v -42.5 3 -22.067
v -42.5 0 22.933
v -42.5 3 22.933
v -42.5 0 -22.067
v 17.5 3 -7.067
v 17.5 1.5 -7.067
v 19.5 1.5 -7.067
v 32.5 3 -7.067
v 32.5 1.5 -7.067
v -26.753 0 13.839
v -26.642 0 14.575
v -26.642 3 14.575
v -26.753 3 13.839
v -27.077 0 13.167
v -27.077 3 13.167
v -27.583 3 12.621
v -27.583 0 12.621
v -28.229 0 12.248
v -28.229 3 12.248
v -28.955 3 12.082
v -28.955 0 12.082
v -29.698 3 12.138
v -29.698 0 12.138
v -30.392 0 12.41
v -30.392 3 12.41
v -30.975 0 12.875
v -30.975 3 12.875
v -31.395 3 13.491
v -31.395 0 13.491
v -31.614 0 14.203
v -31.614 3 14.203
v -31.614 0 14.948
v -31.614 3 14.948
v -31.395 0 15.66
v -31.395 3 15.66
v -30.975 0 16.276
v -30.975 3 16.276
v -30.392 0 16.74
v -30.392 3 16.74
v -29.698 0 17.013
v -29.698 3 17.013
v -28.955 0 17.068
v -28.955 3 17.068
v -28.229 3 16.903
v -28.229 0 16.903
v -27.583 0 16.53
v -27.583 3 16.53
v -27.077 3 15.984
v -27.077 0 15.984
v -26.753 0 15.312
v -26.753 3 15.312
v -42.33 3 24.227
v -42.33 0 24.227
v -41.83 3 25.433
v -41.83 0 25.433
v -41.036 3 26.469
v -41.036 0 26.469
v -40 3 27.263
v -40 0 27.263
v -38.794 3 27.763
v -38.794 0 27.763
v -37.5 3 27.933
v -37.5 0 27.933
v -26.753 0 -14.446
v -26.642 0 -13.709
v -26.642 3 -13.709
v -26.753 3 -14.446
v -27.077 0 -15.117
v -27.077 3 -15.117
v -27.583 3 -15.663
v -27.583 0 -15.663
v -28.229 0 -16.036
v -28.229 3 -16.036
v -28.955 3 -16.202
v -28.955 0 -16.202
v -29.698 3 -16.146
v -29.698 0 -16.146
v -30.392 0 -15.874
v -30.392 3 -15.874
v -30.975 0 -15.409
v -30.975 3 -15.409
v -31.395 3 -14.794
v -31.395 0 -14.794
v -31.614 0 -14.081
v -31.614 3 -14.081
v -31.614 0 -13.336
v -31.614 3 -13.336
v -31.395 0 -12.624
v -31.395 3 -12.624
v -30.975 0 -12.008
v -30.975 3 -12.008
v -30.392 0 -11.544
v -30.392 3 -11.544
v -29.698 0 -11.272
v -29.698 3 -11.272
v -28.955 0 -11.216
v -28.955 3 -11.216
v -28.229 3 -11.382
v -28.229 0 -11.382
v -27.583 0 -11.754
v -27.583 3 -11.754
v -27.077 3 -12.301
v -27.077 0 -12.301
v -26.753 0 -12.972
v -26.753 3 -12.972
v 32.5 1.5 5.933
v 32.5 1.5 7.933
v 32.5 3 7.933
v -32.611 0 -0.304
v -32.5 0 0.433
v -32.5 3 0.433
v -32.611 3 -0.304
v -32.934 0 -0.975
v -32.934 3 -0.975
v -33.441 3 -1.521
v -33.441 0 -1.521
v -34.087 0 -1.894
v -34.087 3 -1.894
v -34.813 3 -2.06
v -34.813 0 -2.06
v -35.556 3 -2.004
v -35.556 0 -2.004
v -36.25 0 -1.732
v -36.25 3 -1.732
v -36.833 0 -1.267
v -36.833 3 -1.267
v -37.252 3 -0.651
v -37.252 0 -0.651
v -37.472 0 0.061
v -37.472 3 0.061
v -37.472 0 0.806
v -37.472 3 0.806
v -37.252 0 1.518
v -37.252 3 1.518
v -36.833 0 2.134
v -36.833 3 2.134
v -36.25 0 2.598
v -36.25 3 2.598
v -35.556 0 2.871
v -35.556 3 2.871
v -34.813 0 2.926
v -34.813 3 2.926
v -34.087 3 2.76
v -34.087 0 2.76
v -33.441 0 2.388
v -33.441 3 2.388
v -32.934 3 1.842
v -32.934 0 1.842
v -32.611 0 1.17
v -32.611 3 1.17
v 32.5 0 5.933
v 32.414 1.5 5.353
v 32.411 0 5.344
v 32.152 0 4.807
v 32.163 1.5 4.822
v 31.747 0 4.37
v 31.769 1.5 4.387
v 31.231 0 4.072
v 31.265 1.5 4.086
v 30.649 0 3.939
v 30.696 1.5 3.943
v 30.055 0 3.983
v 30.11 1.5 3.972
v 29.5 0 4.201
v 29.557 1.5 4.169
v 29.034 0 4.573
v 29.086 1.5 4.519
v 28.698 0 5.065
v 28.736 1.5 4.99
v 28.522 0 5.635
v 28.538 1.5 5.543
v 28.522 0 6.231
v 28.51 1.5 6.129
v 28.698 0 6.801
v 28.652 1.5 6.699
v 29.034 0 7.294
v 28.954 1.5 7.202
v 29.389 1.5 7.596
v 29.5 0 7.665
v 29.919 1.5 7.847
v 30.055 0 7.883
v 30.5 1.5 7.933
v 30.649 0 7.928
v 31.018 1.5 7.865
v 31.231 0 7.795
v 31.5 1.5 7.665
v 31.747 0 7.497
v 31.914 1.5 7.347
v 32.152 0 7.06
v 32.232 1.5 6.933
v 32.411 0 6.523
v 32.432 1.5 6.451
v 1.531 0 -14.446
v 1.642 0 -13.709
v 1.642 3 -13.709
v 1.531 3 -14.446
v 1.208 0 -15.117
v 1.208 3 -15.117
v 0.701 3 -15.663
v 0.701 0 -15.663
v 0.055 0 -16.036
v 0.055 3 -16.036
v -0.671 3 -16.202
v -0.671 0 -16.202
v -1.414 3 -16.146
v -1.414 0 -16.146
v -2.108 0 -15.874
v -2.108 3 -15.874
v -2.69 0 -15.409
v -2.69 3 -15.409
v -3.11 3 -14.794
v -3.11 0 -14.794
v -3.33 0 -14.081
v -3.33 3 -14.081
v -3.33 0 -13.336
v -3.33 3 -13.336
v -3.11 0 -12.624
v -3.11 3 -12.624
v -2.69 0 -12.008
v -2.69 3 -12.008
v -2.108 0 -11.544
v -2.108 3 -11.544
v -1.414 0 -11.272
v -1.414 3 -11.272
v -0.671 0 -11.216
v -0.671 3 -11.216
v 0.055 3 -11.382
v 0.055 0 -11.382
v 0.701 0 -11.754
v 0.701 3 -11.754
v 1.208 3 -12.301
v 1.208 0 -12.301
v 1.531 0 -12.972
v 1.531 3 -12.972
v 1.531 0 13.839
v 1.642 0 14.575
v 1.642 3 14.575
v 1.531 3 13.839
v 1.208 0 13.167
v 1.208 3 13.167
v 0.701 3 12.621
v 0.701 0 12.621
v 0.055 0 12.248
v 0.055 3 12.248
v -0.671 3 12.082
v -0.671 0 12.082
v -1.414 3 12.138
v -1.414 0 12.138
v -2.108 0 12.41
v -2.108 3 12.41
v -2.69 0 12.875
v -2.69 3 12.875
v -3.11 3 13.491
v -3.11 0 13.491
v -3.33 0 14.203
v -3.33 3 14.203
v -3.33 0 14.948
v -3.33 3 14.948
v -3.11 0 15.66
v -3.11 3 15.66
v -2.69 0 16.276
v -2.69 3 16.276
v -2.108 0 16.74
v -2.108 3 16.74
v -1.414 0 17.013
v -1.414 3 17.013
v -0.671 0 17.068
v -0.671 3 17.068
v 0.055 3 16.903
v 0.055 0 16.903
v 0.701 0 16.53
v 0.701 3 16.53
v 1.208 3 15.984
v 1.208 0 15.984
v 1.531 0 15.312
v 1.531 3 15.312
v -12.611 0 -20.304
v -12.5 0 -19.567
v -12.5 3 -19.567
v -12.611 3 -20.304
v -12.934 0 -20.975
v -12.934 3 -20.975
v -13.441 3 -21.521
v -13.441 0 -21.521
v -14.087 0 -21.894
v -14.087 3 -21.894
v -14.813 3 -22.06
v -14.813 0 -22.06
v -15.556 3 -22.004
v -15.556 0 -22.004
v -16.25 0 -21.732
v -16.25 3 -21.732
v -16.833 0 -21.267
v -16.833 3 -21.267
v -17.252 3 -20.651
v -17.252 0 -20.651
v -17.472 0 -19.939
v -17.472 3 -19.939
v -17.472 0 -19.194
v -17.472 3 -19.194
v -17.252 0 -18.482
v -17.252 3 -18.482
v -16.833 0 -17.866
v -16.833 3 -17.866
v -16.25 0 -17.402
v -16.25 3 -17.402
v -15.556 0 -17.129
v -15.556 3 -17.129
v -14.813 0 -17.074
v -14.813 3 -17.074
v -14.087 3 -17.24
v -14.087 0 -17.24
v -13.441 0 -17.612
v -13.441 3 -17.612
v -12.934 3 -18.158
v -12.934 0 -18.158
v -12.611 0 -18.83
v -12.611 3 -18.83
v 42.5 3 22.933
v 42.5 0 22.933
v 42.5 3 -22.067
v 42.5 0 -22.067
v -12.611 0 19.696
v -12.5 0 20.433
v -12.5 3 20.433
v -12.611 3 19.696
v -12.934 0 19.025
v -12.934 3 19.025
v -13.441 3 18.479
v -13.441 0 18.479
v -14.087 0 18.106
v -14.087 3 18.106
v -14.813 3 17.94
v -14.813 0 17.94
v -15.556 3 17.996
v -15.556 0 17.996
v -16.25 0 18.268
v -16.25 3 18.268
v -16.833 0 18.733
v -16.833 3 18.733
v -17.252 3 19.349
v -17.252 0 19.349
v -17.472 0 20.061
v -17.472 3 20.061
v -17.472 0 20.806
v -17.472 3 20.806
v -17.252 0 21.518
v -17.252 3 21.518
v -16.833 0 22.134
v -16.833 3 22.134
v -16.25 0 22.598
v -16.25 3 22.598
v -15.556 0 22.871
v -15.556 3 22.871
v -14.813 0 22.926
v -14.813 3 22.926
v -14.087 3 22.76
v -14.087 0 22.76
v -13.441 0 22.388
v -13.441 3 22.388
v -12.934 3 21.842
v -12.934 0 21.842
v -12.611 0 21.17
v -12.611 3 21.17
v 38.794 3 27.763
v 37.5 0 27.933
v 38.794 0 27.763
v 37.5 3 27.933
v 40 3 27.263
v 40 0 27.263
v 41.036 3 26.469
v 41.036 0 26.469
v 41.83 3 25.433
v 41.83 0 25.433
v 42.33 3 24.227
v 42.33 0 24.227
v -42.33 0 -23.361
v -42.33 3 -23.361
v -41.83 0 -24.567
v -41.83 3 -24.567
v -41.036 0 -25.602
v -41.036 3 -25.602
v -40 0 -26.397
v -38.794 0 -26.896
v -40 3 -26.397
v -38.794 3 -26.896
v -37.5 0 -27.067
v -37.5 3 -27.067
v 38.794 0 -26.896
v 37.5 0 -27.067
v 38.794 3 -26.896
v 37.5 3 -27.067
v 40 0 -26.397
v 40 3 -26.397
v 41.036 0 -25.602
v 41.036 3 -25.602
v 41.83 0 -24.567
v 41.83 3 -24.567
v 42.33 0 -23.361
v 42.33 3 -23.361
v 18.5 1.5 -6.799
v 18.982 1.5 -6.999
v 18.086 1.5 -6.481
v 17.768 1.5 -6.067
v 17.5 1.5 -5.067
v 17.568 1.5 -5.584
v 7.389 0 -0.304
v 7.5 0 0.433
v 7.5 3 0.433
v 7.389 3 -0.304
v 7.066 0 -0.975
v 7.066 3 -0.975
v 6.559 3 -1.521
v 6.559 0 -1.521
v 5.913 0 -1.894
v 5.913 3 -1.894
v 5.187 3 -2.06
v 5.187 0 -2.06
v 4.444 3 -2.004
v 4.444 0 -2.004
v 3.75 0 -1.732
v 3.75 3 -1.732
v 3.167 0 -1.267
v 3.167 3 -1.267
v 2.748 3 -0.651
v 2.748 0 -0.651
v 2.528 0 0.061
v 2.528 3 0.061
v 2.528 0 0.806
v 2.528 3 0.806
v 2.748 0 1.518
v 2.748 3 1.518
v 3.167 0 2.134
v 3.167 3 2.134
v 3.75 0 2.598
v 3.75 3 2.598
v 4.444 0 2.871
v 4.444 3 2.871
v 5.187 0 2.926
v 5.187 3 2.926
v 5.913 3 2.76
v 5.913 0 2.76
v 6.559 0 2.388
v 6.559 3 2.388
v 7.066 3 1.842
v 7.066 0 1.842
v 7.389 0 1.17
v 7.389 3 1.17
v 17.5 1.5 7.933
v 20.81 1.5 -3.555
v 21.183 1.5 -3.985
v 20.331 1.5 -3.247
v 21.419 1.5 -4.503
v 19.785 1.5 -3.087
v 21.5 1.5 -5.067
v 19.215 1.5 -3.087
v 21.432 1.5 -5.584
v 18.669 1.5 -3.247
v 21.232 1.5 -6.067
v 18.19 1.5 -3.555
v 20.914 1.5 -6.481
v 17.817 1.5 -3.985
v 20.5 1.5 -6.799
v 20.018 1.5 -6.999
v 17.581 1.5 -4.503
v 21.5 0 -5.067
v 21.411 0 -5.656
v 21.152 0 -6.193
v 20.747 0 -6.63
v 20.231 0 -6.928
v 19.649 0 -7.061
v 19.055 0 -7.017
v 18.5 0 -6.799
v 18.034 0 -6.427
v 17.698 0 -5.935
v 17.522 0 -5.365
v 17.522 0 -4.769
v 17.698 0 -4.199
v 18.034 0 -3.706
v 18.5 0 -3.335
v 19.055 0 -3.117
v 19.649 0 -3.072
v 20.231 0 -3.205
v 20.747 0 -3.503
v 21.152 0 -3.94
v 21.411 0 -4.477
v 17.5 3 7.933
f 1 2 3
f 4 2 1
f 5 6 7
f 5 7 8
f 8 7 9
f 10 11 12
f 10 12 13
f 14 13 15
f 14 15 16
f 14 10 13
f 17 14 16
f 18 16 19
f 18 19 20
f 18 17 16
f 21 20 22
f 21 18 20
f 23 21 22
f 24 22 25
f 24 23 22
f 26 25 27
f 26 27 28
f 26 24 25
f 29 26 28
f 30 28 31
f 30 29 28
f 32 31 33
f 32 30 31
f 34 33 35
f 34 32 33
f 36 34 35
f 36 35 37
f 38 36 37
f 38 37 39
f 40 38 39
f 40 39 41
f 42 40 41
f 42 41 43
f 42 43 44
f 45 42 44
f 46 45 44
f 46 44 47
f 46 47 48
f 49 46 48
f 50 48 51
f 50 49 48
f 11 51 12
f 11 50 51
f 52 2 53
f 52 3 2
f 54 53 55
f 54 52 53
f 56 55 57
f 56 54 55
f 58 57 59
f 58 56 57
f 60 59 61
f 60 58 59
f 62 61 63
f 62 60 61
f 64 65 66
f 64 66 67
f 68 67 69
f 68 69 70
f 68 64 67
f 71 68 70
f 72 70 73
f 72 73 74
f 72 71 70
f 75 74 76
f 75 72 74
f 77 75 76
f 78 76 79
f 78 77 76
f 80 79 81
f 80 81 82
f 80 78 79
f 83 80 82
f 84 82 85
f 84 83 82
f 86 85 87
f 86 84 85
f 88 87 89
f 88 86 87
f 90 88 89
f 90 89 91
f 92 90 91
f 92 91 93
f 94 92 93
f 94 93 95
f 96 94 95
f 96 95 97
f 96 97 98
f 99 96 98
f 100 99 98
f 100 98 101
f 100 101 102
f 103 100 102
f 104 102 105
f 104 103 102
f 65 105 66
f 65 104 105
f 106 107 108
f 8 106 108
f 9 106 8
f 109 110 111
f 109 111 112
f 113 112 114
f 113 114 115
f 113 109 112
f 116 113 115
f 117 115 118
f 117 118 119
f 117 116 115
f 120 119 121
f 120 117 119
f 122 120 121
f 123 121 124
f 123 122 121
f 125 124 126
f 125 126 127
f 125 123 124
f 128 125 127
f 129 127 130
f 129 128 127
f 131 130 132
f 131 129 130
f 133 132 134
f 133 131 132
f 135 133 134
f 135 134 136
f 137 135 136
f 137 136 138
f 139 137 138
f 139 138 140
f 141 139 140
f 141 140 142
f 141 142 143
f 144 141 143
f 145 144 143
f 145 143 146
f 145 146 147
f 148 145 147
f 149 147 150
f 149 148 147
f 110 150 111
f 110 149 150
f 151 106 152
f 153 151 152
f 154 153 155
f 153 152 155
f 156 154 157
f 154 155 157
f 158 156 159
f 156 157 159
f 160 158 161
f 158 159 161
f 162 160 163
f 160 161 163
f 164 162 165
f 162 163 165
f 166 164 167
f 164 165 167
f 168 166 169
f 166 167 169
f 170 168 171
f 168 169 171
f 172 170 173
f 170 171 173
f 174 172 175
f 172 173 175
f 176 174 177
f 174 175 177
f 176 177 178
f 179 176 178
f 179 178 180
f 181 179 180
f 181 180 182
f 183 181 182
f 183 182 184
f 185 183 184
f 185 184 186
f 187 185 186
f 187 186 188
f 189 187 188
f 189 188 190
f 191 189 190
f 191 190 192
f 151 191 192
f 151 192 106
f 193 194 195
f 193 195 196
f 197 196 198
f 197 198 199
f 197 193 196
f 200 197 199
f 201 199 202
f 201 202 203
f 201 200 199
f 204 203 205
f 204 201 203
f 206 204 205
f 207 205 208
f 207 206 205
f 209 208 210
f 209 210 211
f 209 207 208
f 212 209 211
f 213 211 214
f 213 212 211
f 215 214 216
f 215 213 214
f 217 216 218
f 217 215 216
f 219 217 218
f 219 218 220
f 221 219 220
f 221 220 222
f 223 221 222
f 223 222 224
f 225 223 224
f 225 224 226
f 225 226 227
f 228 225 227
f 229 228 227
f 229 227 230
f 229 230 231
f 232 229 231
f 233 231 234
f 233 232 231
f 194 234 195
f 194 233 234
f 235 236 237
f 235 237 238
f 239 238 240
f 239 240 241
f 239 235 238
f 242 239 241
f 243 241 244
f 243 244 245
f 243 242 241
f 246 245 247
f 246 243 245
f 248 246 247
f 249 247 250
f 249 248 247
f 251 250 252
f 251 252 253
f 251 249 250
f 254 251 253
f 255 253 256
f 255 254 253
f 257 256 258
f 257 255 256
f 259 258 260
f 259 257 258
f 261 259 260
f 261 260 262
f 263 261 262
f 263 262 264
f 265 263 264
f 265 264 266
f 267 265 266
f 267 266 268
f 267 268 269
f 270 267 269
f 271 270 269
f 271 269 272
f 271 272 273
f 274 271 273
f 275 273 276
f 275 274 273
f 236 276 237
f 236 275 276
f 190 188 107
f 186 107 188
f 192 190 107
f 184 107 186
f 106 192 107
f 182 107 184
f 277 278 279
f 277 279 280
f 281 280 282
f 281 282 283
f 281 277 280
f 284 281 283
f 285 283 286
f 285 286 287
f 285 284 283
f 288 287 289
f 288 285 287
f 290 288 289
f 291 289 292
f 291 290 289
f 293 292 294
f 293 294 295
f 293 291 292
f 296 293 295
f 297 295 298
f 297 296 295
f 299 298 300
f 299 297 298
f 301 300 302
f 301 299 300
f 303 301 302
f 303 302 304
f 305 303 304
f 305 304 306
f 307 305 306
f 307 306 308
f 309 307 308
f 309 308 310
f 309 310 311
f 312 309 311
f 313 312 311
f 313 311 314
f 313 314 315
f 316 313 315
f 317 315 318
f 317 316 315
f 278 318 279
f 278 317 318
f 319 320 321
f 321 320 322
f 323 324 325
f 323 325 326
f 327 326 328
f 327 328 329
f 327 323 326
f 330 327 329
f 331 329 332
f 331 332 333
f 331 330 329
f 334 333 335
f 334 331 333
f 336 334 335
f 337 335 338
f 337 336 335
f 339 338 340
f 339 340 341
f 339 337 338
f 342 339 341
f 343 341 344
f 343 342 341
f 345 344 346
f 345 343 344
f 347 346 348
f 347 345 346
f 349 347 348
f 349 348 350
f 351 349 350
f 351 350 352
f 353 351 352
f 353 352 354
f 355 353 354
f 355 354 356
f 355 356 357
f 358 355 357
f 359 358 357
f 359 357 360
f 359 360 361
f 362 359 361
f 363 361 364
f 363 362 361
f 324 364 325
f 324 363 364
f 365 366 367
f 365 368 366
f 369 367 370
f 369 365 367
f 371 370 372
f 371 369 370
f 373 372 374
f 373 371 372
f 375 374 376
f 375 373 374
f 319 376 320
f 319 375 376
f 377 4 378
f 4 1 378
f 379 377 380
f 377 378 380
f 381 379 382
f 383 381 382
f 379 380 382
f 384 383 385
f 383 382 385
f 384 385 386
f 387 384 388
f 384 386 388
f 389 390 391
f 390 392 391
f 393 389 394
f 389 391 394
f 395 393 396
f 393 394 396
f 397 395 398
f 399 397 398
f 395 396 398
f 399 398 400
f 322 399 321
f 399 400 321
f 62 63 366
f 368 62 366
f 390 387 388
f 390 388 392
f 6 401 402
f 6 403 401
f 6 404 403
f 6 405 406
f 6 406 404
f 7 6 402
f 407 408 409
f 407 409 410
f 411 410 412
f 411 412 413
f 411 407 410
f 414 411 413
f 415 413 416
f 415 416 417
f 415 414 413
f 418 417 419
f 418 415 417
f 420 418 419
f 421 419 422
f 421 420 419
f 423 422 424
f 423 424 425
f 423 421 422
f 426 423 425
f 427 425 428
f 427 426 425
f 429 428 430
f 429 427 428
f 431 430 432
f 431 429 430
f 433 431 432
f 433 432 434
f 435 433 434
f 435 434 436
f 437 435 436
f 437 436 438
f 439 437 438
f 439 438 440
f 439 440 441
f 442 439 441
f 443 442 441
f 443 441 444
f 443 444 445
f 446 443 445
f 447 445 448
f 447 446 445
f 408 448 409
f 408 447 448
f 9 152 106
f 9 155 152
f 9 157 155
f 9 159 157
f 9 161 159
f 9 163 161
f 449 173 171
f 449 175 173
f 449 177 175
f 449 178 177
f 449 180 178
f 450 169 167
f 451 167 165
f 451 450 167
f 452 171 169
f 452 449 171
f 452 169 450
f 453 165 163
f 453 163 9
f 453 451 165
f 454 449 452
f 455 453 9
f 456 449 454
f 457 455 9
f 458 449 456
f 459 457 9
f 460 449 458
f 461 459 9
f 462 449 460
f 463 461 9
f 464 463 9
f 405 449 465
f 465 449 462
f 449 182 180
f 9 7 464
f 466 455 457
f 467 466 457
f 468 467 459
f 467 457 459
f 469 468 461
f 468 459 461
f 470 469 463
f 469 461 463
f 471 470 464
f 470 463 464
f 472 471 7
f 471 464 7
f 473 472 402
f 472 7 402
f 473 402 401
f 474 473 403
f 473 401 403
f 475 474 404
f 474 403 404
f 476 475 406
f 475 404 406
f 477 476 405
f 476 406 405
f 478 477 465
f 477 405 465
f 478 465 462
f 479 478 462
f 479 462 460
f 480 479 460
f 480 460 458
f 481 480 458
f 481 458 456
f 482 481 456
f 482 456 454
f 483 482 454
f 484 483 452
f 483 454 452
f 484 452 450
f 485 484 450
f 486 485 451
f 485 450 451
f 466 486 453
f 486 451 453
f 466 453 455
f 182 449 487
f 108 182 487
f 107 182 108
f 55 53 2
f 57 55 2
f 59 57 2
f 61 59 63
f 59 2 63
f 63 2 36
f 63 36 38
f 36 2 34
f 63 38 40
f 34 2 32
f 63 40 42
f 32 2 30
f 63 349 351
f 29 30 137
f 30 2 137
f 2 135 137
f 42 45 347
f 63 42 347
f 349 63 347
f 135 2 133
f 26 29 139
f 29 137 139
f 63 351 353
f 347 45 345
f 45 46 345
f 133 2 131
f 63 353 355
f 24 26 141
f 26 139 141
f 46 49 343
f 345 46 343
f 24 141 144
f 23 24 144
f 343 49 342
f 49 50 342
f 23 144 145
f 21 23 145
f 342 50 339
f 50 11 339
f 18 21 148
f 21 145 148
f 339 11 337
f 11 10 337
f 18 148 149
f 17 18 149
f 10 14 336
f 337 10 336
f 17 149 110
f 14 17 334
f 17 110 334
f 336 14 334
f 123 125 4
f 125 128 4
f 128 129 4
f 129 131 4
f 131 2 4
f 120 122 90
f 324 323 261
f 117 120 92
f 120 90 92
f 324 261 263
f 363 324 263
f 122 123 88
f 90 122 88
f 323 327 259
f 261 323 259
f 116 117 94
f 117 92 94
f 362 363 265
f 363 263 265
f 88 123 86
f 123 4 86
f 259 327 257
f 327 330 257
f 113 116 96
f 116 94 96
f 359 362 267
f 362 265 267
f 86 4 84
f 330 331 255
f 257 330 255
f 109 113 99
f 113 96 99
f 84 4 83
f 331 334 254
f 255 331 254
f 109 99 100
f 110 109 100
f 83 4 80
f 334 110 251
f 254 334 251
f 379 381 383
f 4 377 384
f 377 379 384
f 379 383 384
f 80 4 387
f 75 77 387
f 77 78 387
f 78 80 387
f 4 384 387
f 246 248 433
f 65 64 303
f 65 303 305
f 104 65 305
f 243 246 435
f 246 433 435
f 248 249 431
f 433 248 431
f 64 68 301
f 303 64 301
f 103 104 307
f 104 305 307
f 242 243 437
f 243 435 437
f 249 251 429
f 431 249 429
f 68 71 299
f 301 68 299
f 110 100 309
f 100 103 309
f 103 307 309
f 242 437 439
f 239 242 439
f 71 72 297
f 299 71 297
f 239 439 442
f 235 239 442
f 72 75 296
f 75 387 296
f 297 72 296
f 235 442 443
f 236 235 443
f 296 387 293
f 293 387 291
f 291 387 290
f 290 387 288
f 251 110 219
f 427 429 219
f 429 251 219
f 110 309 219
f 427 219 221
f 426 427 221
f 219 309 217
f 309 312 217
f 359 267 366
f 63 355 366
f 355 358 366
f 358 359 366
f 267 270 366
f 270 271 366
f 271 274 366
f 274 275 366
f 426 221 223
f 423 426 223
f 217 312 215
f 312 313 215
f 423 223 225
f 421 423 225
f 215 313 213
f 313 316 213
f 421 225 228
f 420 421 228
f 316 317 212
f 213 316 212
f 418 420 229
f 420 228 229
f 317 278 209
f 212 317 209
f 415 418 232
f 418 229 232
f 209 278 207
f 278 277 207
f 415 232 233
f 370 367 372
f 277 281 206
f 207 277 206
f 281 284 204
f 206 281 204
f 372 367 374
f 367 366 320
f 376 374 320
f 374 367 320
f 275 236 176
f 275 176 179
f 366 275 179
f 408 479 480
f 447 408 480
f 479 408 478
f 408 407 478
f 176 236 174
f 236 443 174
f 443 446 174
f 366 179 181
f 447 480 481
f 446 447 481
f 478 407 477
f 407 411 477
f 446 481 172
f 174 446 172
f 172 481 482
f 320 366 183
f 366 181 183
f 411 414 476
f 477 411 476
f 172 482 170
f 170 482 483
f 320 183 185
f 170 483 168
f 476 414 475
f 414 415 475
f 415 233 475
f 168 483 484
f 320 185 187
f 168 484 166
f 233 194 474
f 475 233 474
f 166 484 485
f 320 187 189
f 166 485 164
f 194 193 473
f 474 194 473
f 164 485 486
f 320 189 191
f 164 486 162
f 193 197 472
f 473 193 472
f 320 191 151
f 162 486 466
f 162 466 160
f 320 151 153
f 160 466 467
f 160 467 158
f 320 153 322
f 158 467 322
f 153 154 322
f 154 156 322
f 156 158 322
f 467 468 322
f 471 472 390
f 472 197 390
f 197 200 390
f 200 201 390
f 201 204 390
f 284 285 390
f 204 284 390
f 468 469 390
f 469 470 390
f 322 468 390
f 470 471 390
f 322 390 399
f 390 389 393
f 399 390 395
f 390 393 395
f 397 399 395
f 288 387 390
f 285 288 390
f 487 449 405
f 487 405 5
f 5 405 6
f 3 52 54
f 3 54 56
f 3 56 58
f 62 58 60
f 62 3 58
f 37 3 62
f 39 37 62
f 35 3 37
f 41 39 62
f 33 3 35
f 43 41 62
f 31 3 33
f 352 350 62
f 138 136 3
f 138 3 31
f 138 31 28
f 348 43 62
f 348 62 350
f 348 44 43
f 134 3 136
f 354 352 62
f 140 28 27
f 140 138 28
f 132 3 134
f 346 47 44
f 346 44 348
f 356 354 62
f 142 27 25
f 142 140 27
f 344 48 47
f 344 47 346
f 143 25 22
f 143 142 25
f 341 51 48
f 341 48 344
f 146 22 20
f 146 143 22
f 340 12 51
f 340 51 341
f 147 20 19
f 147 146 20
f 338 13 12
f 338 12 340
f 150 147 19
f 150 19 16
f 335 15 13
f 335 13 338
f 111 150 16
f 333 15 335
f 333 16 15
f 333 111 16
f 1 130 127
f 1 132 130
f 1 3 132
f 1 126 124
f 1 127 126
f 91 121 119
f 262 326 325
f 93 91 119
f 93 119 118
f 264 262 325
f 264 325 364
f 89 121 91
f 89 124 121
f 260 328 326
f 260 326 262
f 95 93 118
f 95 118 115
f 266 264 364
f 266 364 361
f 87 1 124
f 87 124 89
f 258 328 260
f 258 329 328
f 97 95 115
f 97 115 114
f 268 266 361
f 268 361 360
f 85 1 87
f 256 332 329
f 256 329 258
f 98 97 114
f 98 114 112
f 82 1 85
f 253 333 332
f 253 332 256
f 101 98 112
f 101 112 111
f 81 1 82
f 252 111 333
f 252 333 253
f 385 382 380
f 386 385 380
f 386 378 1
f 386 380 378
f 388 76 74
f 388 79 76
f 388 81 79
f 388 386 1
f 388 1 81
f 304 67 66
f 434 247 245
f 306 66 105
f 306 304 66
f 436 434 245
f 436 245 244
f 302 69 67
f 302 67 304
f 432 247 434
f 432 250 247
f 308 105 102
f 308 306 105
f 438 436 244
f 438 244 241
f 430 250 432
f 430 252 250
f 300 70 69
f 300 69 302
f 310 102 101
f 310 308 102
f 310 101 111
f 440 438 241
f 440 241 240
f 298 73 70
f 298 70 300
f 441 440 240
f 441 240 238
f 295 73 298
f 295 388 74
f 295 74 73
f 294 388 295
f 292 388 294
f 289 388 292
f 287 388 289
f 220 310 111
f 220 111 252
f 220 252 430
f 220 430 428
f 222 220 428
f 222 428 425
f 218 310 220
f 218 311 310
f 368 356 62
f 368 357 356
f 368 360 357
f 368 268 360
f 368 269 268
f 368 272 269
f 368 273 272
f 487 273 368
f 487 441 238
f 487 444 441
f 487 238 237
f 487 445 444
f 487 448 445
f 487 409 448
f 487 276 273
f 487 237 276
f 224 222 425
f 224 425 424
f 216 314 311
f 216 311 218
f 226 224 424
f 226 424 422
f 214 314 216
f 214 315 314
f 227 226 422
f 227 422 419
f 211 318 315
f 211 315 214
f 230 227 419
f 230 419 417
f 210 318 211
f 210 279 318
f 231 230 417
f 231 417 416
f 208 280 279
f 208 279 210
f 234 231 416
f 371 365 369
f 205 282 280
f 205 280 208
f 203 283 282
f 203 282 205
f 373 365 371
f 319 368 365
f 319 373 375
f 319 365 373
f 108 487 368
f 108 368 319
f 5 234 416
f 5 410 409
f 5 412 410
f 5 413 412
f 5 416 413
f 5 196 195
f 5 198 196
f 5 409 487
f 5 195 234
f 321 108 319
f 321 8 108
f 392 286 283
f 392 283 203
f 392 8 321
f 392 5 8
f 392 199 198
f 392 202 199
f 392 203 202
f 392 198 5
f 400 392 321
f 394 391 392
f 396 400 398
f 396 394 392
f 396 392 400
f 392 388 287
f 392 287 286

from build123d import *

# Parameters (mm, degrees)
SKETCH1_W           = 85
SKETCH1_H           = 55
SKETCH1_R           = 2.5
SKETCH1_W_2         = 15
SKETCH1_H_2         = 15
BOSS_EXTRUDE3_DEPTH = 3
FILLET2_R           = 5
BOSS_EXTRUDE4_REACH = 27
SKETCH2_W           = 15
SKETCH2_H           = 1.5
SKETCH3_R           = 2
CUT_EXTRUDE1_DEPTH  = 10


with BuildPart() as part:
    # Sketch1 → Boss-Extrude3 (new body)
    with BuildSketch(Plane(origin=(0, 0, 0), x_dir=(1, 0, 0), z_dir=(0, 1, 0))):
        with Locations((0, -0.433266932)):
            Rectangle(SKETCH1_W, SKETCH1_H)
        with Locations((-35, -0.433266932)):
            Circle(SKETCH1_R, mode=Mode.SUBTRACT)
        with Locations((-29.142135624, 13.708868691)):
            Circle(SKETCH1_R, mode=Mode.SUBTRACT)
        with Locations((-15, 19.566733068)):
            Circle(SKETCH1_R, mode=Mode.SUBTRACT)
        with Locations((-0.857864376, 13.708868691)):
            Circle(SKETCH1_R, mode=Mode.SUBTRACT)
        with Locations((5, -0.433266932)):
            Circle(SKETCH1_R, mode=Mode.SUBTRACT)
        with Locations((-0.857864376, -14.575402556)):
            Circle(SKETCH1_R, mode=Mode.SUBTRACT)
        with Locations((-15, -20.433266932)):
            Circle(SKETCH1_R, mode=Mode.SUBTRACT)
        with Locations((-29.142135624, -14.575402556)):
            Circle(SKETCH1_R, mode=Mode.SUBTRACT)
        with Locations((25, -0.433266932)):
            Rectangle(SKETCH1_W_2, SKETCH1_H_2, mode=Mode.SUBTRACT)
    extrude(amount=BOSS_EXTRUDE3_DEPTH)

    # Fillet2
    fillet2_edges = [part.edges().sort_by_distance(p)[0] for p in [
        (42.5, 1.5, 27.933266932),
        (-42.5, 1.5, 27.933266932),
        (-42.5, 1.5, -27.066733068),
        (42.5, 1.5, -27.066733068),
    ]]
    fillet(fillet2_edges, radius=FILLET2_R)

    # Sketch2 → Boss-Extrude4 (add, up to next)
    with BuildSketch(Plane(origin=(17.5, 0, 0), x_dir=(0, 0, -1), z_dir=(1, 0, 0)), mode=Mode.PRIVATE) as boss_extrude4_sk1:
        with Locations((-0.433266932, 0.75)):
            Rectangle(SKETCH2_W, SKETCH2_H)
    boss_extrude4_tool1 = extrude(boss_extrude4_sk1.sketch, amount=BOSS_EXTRUDE4_REACH, mode=Mode.PRIVATE) - part.part
    add(boss_extrude4_tool1.solids().sort_by_distance((17.5, 0.75, 0.433267))[0])

    # Sketch3 → Cut-Extrude1 (cut)
    with BuildSketch(Plane(origin=(0, 1.5, 0), x_dir=(1, 0, 0), z_dir=(0, 1, 0))):
        with Locations((30.5, -5.933266932)):
            Circle(SKETCH3_R)
        with Locations((19.5, 5.066733068)):
            Circle(SKETCH3_R)
    extrude(amount=-CUT_EXTRUDE1_DEPTH, mode=Mode.SUBTRACT)


solid = part.part
